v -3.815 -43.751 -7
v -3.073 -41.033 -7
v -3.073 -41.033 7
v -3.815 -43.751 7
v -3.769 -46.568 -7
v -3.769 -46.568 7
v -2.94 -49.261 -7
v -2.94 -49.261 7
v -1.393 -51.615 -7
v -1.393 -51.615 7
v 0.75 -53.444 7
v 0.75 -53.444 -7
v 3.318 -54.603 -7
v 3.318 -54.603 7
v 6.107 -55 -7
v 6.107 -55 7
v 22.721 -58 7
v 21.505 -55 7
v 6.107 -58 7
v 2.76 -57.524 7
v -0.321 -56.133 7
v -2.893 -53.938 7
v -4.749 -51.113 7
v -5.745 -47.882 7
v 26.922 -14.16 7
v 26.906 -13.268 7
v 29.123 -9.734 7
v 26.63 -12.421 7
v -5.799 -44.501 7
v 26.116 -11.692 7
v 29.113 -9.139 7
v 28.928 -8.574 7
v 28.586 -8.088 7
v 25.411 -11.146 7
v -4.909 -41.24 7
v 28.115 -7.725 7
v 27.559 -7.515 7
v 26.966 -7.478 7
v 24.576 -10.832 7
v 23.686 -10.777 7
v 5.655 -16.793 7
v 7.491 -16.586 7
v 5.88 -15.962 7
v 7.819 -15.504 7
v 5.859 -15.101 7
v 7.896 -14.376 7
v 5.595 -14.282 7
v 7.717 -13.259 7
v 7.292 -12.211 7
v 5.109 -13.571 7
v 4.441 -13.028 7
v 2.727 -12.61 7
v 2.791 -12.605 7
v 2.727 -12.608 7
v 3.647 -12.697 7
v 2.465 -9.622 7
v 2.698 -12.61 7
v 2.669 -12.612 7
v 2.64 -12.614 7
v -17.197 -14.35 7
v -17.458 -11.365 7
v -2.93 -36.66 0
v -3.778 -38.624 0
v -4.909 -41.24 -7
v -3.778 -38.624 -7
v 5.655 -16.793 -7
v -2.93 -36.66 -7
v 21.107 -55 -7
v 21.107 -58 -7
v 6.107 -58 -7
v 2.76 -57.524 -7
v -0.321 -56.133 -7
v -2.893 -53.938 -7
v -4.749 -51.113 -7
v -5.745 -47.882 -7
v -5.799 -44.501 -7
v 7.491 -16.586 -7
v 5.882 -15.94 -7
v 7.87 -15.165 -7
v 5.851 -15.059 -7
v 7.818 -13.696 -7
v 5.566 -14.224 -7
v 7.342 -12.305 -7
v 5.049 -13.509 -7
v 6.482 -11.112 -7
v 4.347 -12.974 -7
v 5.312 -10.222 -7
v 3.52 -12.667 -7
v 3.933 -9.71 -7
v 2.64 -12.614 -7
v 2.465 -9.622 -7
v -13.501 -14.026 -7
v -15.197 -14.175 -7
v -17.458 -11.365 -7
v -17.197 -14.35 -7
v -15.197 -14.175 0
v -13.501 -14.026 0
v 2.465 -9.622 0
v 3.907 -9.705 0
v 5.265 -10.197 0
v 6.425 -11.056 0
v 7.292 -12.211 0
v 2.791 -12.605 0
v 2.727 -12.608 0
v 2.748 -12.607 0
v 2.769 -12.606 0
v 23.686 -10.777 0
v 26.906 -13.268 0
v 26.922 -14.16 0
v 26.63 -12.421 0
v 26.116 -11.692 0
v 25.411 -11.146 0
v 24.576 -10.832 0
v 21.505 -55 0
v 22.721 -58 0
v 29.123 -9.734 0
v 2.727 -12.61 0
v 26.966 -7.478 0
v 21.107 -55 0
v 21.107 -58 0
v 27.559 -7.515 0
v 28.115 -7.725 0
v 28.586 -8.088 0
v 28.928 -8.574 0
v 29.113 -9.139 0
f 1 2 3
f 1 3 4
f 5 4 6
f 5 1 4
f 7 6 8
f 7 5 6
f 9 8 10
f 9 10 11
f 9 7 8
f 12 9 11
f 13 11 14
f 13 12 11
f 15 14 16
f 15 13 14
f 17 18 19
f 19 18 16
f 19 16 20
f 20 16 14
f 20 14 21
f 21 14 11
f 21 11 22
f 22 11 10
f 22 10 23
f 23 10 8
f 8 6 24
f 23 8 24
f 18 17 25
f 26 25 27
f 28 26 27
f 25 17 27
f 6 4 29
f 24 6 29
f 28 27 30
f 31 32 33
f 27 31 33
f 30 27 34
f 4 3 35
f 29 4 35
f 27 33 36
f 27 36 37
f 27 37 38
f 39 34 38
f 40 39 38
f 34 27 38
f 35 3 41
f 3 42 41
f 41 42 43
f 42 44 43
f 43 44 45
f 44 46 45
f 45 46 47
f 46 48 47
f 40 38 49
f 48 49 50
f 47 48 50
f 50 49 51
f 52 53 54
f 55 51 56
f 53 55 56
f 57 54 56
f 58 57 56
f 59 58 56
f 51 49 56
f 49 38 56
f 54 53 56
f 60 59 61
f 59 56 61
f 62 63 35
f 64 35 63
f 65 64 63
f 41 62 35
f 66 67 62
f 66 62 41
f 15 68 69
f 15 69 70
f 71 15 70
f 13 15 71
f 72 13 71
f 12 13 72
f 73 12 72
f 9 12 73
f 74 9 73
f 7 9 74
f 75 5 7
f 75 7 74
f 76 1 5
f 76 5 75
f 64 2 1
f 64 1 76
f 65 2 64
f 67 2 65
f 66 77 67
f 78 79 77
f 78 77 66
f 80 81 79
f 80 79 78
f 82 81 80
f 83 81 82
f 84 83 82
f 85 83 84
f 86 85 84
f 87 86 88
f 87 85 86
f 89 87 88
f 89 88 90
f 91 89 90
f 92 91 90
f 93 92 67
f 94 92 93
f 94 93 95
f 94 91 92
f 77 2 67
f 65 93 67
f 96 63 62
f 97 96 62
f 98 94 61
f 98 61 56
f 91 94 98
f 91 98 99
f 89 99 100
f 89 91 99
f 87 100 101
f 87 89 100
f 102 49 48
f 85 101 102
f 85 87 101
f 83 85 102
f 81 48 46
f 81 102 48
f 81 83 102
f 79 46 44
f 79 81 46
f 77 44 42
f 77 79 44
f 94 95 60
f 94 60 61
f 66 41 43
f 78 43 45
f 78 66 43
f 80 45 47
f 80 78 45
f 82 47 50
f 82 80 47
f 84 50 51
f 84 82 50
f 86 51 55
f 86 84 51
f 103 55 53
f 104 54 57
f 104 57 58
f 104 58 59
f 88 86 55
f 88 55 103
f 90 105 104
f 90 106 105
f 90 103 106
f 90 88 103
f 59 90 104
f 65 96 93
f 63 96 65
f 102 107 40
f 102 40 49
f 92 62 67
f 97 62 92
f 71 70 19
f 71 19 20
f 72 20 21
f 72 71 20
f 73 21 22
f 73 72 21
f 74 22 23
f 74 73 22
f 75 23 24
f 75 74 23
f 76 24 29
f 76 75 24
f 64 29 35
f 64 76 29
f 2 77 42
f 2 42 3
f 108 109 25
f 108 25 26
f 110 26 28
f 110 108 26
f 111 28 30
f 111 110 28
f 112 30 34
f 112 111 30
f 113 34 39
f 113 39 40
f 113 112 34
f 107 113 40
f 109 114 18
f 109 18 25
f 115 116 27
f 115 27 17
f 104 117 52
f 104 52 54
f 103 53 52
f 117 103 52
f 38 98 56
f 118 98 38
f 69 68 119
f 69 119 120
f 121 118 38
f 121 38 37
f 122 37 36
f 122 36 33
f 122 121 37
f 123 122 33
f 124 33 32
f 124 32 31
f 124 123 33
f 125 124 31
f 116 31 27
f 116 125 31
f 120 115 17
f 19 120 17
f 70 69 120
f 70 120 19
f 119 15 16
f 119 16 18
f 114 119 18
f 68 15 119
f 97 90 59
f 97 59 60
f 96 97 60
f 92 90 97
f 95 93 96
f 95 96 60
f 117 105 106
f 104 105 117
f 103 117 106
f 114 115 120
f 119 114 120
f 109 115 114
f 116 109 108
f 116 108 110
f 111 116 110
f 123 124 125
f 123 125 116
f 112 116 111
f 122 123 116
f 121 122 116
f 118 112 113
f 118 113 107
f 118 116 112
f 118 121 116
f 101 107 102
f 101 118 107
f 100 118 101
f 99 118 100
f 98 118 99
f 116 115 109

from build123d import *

# Parameters (mm, degrees)
BOSS_EXTRUDE1_DEPTH      = 7
BOSS_EXTRUDE1_DEPTH_BACK = 7
BOSS_EXTRUDE2_DEPTH      = 7
BOSS_EXTRUDE3_DEPTH      = 7


with BuildPart() as part:
    # Sketch1 → Boss-Extrude1 (new, two sides: drawn at the far end of the back side and taken through both)
    with BuildSketch(Plane.XY.offset(-BOSS_EXTRUDE1_DEPTH_BACK)):
        with BuildLine():
            Line((-17.458418155, -11.36484808), (2.465475807, -9.621733225))
            ThreePointArc((2.465475807, -9.621733225), (6.955793602, -11.676837129), (7.491085956, -16.585998774))
            Line((7.491085956, -16.585998774), (-3.072780906, -41.033415882))
            ThreePointArc((-3.072780906, -41.033415882), (-2.24972743, -50.492456592), (6.106881965, -55))
            Line((6.106881965, -55), (21.106881965, -55))
            Line((21.106881965, -55), (21.106881965, -58))
            Line((21.106881965, -58), (6.106881965, -58))
            ThreePointArc((6.106881965, -58), (-3.921049309, -52.59094791), (-4.908713481, -41.240099059))
            Line((-4.908713481, -41.240099059), (5.655153382, -16.79268195))
            ThreePointArc((5.655153382, -16.79268195), (5.333977969, -13.847184963), (2.639787292, -12.614122621))
            Line((2.639787292, -12.614122621), (-17.197282581, -14.349641352))
            Line((-17.197282581, -14.349641352), (-17.458418155, -11.36484808))
        make_face()
    extrude(amount=BOSS_EXTRUDE1_DEPTH + BOSS_EXTRUDE1_DEPTH_BACK)

    # Sketch3 → Boss-Extrude2 (add)
    with BuildSketch(Plane.XY):
        with BuildLine():
            Line((2.465475807, -9.621733225), (26.965836734, -7.478229391))
            ThreePointArc((26.965836734, -7.478229391), (28.585544777, -8.088291477), (29.122784537, -9.733588816))
            Line((29.122784537, -9.733588816), (22.720894567, -58))
            Line((22.720894567, -58), (21.106881965, -58))
            Line((21.106881965, -58), (21.106881965, -55))
            Line((21.106881965, -55), (21.504791597, -55))
            Line((21.504791597, -55), (26.921714347, -14.159650971))
            ThreePointArc((26.921714347, -14.159650971), (26.115854708, -11.691704962), (23.686292644, -10.776611833))
            Line((23.686292644, -10.776611833), (2.726943035, -12.610317319))
            Line((2.726943035, -12.610317319), (2.465475807, -9.621733225))
        make_face()
    extrude(amount=BOSS_EXTRUDE2_DEPTH)

    # Sketch4 → Boss-Extrude3 (add)
    with BuildSketch(Plane.XY):
        Polygon((-15.197282581, -14.174664025), (-3.7781853, -38.623775477), (-2.92955004, -36.659822272), (-13.500697735, -14.026232084), align=None)
    extrude(amount=-BOSS_EXTRUDE3_DEPTH)


solid = part.part
